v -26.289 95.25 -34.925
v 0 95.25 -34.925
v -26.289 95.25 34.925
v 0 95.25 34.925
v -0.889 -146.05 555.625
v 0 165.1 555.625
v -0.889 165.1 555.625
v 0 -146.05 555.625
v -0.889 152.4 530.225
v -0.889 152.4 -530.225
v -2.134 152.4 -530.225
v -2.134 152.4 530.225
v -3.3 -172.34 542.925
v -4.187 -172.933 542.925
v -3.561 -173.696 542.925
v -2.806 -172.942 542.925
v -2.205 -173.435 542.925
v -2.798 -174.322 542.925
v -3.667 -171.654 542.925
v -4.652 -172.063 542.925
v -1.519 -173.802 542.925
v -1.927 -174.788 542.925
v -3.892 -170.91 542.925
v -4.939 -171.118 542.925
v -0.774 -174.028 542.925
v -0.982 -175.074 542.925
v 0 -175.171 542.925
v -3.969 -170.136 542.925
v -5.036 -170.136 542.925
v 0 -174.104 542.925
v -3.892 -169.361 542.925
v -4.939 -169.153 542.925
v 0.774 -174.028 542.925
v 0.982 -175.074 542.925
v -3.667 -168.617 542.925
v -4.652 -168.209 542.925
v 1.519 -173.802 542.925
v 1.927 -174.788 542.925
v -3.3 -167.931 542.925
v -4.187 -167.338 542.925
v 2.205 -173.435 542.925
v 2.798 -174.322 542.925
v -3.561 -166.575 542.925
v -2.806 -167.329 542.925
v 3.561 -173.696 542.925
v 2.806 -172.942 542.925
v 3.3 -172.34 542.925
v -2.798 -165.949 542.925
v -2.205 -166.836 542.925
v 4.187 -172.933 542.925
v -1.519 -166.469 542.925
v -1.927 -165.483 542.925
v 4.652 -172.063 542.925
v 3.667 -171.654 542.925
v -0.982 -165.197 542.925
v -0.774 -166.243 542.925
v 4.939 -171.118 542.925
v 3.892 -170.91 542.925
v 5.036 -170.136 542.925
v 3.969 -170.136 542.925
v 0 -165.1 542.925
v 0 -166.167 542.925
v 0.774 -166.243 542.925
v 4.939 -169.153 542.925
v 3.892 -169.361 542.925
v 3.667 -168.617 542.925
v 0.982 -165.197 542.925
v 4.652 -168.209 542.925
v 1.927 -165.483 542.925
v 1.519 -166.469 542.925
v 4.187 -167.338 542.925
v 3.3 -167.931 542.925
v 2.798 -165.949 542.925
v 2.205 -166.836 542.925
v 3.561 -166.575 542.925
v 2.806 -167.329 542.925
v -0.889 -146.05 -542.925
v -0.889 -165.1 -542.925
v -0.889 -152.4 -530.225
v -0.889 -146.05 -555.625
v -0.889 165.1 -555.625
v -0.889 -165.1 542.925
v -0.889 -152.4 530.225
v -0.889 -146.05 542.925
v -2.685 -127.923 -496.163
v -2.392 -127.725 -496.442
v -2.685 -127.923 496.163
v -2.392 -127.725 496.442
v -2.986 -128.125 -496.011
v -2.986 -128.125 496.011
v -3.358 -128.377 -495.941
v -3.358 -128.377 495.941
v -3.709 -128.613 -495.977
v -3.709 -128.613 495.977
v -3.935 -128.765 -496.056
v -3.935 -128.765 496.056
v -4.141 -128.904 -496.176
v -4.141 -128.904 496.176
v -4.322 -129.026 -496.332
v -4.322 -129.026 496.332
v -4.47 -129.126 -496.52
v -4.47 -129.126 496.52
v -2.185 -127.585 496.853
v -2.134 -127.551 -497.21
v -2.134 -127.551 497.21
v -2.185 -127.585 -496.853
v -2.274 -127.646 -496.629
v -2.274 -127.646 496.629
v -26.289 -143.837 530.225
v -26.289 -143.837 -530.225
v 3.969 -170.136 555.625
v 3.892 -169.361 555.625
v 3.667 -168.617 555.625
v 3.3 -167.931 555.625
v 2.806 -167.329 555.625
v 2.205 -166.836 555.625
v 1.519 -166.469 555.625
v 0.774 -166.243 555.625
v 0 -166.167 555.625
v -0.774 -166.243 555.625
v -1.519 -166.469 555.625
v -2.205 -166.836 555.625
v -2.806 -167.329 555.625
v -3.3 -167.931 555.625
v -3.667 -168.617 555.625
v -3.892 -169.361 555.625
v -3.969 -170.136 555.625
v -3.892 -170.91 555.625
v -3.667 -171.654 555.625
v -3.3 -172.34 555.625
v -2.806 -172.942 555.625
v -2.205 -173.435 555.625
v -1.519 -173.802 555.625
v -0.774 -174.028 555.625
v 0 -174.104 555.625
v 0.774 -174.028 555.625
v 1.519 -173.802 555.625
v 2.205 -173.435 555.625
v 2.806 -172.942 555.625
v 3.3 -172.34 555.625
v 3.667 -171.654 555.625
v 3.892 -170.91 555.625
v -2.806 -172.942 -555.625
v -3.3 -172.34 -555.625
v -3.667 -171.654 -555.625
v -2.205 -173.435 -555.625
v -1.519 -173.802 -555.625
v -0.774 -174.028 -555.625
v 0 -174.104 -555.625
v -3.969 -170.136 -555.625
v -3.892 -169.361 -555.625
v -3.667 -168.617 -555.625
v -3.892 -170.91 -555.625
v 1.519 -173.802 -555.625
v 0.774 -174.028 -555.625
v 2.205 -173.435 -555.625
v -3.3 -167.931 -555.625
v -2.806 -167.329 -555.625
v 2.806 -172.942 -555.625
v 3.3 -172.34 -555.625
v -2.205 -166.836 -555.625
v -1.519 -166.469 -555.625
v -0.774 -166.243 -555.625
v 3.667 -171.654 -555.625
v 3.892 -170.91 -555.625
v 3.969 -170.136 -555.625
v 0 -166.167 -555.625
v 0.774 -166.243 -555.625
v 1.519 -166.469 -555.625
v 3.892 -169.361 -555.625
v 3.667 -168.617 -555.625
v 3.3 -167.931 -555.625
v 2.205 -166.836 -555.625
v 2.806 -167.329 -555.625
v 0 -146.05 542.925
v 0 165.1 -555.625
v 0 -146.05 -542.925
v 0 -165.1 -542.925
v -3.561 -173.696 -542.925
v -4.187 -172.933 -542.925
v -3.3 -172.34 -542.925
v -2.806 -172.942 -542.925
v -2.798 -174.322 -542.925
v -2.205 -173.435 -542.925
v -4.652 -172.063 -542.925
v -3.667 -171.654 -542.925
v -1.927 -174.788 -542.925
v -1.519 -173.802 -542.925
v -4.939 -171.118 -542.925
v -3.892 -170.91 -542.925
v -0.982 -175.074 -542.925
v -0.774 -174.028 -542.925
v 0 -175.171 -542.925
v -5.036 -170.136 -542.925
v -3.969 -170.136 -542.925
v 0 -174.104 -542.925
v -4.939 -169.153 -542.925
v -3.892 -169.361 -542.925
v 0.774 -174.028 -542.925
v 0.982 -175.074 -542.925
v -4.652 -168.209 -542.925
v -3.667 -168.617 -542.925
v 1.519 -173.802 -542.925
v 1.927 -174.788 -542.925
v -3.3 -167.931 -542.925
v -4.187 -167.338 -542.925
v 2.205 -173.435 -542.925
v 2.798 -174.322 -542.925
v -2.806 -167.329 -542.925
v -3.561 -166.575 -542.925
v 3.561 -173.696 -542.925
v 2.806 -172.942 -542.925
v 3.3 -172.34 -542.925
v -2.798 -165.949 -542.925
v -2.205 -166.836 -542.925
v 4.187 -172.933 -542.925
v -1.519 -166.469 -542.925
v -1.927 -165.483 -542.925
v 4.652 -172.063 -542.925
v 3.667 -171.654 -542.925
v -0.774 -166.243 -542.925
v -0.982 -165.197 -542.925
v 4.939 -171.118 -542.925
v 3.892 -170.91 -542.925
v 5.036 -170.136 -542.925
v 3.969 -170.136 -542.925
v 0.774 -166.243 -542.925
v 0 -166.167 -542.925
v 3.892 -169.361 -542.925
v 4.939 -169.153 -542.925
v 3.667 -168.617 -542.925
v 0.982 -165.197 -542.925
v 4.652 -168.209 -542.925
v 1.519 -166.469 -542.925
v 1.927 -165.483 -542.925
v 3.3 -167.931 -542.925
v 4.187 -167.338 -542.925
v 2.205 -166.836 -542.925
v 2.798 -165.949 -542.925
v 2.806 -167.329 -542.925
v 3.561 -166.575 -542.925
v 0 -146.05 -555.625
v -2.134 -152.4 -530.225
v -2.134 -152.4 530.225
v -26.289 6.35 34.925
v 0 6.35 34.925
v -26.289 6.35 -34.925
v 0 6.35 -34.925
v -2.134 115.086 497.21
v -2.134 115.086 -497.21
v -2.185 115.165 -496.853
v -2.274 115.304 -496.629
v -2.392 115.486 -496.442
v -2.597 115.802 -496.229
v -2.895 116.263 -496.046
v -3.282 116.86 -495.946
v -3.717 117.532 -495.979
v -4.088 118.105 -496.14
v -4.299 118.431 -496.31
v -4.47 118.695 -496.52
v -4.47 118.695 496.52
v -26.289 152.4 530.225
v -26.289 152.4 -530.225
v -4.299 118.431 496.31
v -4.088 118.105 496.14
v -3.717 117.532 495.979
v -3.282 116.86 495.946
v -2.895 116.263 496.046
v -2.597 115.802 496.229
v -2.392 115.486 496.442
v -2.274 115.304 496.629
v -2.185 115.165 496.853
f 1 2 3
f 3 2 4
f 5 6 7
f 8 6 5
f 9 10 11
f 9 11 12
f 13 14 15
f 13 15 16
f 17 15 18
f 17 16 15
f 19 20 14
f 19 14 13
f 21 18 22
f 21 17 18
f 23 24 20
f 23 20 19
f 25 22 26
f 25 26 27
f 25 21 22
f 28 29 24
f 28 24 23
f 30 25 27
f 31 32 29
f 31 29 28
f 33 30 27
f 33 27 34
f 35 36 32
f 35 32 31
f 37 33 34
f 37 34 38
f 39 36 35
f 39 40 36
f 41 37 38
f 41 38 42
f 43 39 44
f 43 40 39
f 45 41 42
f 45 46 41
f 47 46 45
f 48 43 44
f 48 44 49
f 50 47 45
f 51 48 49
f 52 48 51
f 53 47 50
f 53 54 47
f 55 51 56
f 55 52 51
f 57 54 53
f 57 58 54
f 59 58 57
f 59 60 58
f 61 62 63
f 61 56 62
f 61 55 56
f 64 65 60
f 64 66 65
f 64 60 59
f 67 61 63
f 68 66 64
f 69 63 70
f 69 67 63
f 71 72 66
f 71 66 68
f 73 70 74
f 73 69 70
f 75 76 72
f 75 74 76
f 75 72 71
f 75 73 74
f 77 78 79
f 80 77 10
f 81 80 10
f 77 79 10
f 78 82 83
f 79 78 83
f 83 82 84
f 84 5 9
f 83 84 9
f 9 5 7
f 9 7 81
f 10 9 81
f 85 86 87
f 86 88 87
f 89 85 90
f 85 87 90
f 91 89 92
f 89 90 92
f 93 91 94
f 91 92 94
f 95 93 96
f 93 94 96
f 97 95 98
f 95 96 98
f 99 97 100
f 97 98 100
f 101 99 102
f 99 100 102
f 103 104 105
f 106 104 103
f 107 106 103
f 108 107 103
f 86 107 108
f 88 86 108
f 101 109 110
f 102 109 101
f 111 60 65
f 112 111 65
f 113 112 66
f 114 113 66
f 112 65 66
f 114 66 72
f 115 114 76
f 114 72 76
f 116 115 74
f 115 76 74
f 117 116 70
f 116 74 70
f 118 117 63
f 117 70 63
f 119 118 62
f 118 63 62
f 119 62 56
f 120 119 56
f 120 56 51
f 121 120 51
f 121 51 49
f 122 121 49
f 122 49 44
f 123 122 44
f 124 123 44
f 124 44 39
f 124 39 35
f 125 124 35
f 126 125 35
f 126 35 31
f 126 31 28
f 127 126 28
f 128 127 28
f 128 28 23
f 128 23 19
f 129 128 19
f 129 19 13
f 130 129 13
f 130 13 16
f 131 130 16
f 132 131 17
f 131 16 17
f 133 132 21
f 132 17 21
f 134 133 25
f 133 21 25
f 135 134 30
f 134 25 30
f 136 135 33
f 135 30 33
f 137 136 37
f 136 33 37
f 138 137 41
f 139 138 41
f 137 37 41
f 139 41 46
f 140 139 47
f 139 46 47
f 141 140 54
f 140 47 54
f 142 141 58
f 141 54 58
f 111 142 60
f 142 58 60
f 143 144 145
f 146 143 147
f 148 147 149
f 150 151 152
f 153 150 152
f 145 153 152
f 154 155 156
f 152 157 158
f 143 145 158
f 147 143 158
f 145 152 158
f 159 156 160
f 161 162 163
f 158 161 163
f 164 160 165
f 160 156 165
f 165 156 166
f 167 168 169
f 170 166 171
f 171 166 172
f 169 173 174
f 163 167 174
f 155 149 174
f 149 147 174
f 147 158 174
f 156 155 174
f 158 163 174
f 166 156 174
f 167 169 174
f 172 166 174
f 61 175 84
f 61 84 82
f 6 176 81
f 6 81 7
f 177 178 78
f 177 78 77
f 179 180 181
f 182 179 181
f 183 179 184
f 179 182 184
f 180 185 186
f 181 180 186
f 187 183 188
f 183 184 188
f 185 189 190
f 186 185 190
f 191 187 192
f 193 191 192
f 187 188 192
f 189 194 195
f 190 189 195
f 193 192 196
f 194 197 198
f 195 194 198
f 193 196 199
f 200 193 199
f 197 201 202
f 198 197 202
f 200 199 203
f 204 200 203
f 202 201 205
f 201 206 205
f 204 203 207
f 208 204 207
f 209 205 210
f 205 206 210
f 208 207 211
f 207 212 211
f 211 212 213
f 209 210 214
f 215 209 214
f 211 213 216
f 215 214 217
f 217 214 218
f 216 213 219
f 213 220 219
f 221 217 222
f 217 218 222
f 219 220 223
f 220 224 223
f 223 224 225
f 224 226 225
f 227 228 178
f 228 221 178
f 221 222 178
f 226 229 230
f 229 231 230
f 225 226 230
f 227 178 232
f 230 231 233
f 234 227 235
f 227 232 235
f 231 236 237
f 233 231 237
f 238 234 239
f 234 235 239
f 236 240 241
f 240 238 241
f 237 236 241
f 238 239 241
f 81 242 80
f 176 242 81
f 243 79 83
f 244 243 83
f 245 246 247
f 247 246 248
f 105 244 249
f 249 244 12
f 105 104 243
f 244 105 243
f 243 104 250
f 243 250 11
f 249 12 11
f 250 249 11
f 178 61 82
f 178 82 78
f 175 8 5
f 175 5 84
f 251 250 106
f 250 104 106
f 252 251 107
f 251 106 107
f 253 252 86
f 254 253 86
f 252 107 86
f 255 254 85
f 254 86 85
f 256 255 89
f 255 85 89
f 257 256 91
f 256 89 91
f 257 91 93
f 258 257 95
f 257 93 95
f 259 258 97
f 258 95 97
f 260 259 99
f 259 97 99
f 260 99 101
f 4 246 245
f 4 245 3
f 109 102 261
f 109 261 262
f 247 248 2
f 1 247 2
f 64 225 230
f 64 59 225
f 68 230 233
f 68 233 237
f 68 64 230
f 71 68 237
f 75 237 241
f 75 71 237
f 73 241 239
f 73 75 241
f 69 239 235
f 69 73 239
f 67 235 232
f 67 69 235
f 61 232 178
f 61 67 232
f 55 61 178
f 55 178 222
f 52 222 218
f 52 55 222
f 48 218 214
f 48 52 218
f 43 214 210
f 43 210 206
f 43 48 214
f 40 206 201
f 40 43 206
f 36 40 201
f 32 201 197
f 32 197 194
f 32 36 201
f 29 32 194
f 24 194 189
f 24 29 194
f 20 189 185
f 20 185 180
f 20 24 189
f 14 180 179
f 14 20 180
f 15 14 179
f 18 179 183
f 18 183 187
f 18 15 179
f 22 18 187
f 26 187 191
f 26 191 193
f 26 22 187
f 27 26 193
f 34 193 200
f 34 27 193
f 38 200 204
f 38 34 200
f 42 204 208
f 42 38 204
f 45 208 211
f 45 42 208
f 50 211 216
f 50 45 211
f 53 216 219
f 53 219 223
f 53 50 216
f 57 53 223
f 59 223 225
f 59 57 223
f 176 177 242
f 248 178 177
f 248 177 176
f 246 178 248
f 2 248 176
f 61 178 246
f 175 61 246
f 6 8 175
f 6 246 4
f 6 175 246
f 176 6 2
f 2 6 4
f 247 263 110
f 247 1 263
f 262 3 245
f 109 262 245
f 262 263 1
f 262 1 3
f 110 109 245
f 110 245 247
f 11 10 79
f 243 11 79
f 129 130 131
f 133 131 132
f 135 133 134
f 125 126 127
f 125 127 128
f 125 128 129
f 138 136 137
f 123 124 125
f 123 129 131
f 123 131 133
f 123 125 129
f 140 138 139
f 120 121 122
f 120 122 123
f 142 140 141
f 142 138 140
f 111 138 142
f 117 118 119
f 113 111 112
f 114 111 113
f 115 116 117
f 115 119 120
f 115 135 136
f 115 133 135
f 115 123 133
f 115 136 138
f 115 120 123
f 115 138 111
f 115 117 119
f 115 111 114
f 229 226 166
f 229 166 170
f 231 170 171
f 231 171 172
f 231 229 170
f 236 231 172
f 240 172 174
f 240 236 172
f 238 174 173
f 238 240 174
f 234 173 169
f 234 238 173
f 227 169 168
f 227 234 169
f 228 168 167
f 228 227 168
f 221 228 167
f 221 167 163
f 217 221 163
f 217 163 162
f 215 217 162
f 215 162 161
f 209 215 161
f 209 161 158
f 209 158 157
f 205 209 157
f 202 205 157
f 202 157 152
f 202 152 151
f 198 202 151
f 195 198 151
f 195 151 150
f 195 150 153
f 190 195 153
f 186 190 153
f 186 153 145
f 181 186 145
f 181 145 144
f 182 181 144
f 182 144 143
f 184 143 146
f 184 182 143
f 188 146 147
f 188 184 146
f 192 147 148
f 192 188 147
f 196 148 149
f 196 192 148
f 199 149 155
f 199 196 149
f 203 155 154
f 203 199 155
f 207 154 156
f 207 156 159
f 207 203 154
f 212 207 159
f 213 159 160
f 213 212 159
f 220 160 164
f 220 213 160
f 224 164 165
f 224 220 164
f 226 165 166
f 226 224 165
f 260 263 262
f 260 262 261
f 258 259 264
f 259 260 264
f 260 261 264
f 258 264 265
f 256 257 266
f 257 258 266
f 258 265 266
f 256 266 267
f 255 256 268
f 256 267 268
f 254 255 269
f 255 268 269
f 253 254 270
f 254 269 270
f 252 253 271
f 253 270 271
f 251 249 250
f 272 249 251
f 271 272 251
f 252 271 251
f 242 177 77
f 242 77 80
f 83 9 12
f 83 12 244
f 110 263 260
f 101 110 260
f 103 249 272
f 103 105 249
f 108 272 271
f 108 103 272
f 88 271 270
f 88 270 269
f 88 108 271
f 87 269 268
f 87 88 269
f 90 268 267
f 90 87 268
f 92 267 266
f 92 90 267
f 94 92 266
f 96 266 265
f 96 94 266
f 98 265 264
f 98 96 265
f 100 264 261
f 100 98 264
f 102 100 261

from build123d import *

# Parameters (mm, degrees)
F1_DEPTH       = 0.889
F2_W           = 304.8
F2_H           = 1060.45
F3_DEPTH       = 25.4
F5_DEPTH       = 317.501
F7_DEPTH       = 1085.851
F8_R           = 1.27
F9_W           = 88.9
F9_H           = 34.925
F10_DEPTH      = 26.29
F11_R          = 5.03555
F11_R_2        = 3.96875
F12_DEPTH      = 542.925
F12_DEPTH_BACK = 542.925
F13_R          = 3.96875
F14_DEPTH      = 555.625
F14_DEPTH_BACK = 555.625


# Not quite as in the source:
# - a feature names something its author has since deleted; it is built from what else it names


with BuildPart() as f1:
    # F0 (on Right) → F1 (new body)
    with BuildSketch(Plane.YZ):
        Polygon((165.1, 555.625), (-146.05, 555.625), (-146.05, 542.925), (-165.1, 542.925), (-165.1, 0), (165.1, 0), align=None)
        Polygon((165.1, -555.625), (165.1, 0), (-165.1, 0), (-165.1, -542.925), (-146.05, -542.925), (-146.05, -555.625), align=None)
    extrude(amount=-F1_DEPTH)

    # F2 (on face) → F3 (join)
    with BuildSketch(Plane(origin=(-0.889, 0, 0), x_dir=(0, -1, 0), z_dir=(-1, 0, 0))):
        Rectangle(F2_W, F2_H)
    extrude(amount=F3_DEPTH)

    # F4 (on face) → F5 (cut, through all)
    with BuildSketch(Plane(origin=(0, 152.4, 0), x_dir=(-1, 0, 0), z_dir=(0, 1, 0))):
        Polygon((2.1336, -530.225), (26.289, -530.225), (2.1336, -492.9112069626), align=None)
        Polygon((2.1336, 492.9112069626), (26.289, 530.225), (2.1336, 530.225), align=None)
    extrude(amount=-F5_DEPTH, mode=Mode.SUBTRACT)

    # F6 (on face) → F7 (cut, through all)
    with BuildSketch(Plane.XY.offset(530.225)):
        Polygon((-2.1336, -152.4), (-2.1336, -127.550815087), (-38.989, -152.4), align=None)
        Polygon((-2.1336, 152.4), (-26.289, 152.4), (-2.1336, 115.0862069626), align=None)
    extrude(amount=-F7_DEPTH, mode=Mode.SUBTRACT)

    # F8
    f8_edges = [f1.edges().sort_by_distance(p)[0] for p in [
        (-2.1336, -6.232304, 492.911207),
        (-2.1336, -6.232304, -492.911207),
    ]]
    fillet(f8_edges, radius=F8_R)

    # F9 (on face) → F10 (cut, through all)
    with BuildSketch(Plane.YZ):
        with Locations((50.8, 17.4625)):
            Rectangle(F9_W, F9_H)
        with Locations((50.8, -17.4625)):
            Rectangle(F9_W, F9_H)
    extrude(amount=-F10_DEPTH, mode=Mode.SUBTRACT)


with BuildPart() as f12:
    # F11 (on Top) → F12 (new body, two sides)
    with BuildSketch(Plane.XY) as f12_sk:
        with Locations((0, -170.13555)):
            Circle(F11_R)
        with Locations((0, -170.13555)):
            Circle(F11_R_2, mode=Mode.SUBTRACT)
    extrude(amount=F12_DEPTH)
    extrude(f12_sk.sketch, amount=-F12_DEPTH_BACK)

    # F13 (on Top) → F14 (join, two sides)
    with BuildSketch(Plane.XY) as f14_sk:
        with Locations((0, -170.13555)):
            Circle(F13_R)
    extrude(amount=F14_DEPTH)
    extrude(f14_sk.sketch, amount=-F14_DEPTH_BACK)


solid = Compound([f1.part, f12.part])
